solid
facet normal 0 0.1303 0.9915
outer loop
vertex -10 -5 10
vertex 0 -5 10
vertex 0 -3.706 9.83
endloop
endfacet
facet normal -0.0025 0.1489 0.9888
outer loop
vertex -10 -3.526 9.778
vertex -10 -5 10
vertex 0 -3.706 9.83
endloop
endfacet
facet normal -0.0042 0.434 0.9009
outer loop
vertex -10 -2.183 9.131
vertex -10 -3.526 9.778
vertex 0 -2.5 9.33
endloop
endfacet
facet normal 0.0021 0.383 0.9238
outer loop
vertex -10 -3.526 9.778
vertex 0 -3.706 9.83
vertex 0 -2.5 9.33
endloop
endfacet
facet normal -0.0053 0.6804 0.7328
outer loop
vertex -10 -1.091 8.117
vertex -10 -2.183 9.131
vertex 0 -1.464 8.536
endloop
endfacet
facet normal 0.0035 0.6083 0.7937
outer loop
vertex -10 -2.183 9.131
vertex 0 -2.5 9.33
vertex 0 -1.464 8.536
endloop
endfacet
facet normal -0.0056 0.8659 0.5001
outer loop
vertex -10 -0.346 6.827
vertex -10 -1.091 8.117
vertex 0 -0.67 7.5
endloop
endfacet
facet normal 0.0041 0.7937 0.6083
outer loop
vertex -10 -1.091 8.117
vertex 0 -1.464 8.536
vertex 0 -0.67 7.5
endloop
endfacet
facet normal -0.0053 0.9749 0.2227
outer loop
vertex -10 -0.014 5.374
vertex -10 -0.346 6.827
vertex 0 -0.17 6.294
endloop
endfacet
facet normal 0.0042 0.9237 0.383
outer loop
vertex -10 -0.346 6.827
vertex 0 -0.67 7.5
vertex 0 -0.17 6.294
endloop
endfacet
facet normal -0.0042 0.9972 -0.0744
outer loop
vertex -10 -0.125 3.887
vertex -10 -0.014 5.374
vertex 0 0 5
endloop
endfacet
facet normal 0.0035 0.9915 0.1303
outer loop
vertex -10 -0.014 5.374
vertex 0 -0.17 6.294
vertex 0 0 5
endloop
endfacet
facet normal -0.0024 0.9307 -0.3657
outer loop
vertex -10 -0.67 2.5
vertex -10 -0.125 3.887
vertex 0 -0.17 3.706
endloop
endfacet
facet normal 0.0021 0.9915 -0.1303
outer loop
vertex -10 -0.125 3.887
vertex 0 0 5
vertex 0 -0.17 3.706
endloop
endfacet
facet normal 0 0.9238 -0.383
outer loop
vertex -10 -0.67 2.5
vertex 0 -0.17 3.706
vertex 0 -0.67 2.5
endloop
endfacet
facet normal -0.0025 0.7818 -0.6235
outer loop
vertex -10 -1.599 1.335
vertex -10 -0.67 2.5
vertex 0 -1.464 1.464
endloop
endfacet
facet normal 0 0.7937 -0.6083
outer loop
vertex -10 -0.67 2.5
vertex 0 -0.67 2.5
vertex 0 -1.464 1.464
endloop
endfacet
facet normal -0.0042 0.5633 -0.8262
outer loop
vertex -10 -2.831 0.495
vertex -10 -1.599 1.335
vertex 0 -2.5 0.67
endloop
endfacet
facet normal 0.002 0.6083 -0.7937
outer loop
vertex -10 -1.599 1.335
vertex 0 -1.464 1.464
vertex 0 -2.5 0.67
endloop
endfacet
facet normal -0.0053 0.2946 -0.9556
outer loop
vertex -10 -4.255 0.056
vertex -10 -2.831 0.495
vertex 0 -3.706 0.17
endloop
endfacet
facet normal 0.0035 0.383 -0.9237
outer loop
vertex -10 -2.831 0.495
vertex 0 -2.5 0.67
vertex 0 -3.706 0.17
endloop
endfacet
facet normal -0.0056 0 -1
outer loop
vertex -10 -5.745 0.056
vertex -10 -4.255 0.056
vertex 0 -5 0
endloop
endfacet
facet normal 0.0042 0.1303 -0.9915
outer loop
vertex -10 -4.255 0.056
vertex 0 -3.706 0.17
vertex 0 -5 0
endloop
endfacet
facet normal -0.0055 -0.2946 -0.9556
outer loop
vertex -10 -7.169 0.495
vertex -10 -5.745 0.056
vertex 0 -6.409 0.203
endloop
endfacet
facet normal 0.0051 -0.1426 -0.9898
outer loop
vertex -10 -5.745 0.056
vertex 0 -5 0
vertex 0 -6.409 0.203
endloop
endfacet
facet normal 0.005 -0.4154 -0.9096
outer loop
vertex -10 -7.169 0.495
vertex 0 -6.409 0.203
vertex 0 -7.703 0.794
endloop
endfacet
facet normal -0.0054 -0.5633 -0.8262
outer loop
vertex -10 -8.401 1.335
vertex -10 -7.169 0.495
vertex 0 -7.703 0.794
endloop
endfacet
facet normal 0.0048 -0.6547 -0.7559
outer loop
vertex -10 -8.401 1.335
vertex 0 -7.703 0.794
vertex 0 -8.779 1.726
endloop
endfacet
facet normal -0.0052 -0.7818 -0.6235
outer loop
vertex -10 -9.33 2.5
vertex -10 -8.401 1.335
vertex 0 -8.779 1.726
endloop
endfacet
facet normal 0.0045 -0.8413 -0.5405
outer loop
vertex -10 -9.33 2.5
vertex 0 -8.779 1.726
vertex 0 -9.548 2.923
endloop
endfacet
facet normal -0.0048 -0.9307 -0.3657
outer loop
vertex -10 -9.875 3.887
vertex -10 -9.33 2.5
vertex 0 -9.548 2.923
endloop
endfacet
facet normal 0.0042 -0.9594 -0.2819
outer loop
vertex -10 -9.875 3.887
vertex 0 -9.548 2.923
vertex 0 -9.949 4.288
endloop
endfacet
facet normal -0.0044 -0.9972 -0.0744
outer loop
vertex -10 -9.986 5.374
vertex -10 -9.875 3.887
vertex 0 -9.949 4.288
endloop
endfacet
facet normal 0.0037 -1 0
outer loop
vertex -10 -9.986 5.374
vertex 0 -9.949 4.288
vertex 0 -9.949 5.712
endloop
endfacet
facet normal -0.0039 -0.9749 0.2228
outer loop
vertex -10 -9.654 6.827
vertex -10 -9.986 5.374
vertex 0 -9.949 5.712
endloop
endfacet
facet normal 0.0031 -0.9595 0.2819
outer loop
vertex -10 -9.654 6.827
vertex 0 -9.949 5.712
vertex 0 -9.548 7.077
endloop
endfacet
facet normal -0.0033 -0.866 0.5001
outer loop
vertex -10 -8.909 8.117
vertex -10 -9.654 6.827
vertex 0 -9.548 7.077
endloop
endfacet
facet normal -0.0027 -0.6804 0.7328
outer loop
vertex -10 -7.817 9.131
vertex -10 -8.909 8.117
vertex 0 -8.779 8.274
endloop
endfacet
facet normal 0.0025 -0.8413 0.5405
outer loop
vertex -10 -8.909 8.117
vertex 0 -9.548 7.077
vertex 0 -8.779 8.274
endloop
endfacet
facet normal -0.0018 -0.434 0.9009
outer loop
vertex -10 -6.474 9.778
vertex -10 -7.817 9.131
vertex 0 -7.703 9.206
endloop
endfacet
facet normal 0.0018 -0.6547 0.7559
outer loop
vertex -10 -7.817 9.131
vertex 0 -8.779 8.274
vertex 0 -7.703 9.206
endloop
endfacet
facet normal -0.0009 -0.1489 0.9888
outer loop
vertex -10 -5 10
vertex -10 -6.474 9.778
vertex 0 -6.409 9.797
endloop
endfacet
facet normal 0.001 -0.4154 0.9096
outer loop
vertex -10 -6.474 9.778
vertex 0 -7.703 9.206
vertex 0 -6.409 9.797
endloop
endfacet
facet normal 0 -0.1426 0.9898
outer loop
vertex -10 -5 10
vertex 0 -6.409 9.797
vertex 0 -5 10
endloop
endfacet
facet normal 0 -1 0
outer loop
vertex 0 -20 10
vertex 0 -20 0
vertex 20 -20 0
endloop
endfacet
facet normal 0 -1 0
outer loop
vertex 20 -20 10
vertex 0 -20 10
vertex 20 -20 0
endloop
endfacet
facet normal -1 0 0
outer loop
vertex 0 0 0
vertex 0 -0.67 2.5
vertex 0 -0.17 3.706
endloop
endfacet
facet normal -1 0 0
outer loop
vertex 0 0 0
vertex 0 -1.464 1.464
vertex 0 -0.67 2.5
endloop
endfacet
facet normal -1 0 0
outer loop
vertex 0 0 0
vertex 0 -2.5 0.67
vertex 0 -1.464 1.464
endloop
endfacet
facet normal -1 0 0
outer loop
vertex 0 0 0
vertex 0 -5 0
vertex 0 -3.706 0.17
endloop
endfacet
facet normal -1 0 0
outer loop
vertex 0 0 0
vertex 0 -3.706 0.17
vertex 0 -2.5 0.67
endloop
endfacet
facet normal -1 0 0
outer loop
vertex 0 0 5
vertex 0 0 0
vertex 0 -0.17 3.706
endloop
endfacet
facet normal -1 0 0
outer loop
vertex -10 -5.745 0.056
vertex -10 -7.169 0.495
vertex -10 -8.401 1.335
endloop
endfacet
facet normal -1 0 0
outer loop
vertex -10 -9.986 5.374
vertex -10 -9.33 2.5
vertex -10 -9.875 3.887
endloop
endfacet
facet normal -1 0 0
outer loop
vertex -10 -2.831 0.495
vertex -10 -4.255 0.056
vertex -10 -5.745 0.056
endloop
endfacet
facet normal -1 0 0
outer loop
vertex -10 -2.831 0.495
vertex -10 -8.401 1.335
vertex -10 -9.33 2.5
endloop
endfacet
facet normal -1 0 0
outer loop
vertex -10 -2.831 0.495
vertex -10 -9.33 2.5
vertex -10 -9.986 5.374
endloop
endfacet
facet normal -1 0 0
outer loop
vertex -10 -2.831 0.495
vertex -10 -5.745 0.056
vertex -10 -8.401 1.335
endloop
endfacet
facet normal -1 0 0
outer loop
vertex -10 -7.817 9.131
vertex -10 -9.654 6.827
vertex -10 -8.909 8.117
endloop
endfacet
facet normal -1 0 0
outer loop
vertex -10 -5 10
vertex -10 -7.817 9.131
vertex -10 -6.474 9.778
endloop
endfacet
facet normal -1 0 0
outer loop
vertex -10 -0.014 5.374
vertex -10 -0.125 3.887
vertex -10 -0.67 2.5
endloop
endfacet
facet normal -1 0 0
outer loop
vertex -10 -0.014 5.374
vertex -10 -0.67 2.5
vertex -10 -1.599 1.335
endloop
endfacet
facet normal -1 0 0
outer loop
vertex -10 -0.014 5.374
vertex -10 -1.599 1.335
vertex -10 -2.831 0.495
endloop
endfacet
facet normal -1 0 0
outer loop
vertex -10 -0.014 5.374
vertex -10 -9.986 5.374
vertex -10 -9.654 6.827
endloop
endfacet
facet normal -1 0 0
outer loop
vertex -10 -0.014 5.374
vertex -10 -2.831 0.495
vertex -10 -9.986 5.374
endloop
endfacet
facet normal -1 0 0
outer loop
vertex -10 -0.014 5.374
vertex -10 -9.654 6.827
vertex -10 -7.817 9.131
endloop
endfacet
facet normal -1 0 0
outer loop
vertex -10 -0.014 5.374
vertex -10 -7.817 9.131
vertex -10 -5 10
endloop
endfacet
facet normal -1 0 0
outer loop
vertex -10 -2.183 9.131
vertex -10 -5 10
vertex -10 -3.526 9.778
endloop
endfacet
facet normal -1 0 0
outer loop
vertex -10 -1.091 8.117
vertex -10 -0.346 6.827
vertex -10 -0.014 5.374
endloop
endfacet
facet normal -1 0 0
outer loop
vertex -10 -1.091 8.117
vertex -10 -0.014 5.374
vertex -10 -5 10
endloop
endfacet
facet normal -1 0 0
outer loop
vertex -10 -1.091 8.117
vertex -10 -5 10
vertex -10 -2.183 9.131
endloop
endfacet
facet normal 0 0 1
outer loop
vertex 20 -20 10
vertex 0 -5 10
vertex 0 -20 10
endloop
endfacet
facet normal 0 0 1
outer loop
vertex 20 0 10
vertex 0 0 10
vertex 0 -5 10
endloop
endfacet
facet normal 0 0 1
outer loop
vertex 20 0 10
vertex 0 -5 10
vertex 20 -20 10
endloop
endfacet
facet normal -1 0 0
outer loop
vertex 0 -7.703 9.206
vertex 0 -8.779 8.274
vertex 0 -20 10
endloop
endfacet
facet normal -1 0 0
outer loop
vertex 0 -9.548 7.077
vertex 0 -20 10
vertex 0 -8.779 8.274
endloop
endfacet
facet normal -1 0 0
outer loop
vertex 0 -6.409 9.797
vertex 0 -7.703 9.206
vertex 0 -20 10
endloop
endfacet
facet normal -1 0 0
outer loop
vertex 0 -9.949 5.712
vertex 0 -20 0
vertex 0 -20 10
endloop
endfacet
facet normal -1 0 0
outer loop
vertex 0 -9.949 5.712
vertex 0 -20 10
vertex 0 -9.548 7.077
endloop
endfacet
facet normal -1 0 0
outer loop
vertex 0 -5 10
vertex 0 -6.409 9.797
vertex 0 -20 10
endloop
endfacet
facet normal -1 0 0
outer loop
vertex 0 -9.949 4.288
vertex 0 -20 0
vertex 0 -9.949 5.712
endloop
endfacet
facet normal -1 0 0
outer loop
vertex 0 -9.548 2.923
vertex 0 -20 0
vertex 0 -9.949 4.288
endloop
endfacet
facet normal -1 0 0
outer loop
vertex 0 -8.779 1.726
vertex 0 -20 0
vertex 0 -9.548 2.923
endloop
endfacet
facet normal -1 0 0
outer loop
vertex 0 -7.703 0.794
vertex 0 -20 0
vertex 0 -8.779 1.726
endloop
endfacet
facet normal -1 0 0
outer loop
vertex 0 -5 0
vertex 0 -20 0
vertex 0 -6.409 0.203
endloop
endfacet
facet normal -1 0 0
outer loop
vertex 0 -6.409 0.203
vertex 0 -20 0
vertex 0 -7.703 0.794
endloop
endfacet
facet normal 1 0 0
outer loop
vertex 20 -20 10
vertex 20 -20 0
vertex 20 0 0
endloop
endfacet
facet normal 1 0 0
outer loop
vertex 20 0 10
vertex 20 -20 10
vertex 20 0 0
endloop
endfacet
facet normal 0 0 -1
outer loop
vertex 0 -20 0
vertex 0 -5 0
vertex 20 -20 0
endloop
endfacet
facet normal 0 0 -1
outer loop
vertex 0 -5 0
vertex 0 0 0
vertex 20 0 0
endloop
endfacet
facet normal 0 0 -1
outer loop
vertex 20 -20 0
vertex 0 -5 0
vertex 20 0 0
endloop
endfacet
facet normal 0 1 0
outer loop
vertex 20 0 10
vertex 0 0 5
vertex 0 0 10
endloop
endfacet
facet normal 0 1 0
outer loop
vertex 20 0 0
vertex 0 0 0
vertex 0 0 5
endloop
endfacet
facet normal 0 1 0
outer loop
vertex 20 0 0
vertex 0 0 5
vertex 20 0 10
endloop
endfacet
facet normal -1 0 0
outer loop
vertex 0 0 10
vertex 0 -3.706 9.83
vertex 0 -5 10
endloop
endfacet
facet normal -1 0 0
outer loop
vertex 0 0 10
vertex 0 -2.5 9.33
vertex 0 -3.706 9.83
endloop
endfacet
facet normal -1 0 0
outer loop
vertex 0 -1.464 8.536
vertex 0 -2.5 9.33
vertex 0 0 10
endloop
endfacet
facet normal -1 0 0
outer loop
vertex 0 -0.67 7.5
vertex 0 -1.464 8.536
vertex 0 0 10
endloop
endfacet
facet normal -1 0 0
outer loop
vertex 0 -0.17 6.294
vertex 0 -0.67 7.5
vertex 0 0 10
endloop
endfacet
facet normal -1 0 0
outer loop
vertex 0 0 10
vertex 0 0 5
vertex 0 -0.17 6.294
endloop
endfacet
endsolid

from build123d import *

# Parameters (mm, degrees)
SKETCH_1_W      = 20
SKETCH_1_H      = 20
EXTRUDE_1_DEPTH = 10
SKETCH_2_R      = 5
EXTRUDE_2_DEPTH = 10


with BuildPart() as part:
    # 草图1 → 凸台-拉伸1 (new body)
    with BuildSketch(Plane.XY):
        with Locations((10, -10)):
            Rectangle(SKETCH_1_W, SKETCH_1_H)
    extrude(amount=EXTRUDE_1_DEPTH)

    # 草图2 → 凸台-拉伸2 (add)
    with BuildSketch(Plane.ZY):
        with Locations((5, -5)):
            Circle(SKETCH_2_R)
    extrude(amount=EXTRUDE_2_DEPTH)


solid = part.part
